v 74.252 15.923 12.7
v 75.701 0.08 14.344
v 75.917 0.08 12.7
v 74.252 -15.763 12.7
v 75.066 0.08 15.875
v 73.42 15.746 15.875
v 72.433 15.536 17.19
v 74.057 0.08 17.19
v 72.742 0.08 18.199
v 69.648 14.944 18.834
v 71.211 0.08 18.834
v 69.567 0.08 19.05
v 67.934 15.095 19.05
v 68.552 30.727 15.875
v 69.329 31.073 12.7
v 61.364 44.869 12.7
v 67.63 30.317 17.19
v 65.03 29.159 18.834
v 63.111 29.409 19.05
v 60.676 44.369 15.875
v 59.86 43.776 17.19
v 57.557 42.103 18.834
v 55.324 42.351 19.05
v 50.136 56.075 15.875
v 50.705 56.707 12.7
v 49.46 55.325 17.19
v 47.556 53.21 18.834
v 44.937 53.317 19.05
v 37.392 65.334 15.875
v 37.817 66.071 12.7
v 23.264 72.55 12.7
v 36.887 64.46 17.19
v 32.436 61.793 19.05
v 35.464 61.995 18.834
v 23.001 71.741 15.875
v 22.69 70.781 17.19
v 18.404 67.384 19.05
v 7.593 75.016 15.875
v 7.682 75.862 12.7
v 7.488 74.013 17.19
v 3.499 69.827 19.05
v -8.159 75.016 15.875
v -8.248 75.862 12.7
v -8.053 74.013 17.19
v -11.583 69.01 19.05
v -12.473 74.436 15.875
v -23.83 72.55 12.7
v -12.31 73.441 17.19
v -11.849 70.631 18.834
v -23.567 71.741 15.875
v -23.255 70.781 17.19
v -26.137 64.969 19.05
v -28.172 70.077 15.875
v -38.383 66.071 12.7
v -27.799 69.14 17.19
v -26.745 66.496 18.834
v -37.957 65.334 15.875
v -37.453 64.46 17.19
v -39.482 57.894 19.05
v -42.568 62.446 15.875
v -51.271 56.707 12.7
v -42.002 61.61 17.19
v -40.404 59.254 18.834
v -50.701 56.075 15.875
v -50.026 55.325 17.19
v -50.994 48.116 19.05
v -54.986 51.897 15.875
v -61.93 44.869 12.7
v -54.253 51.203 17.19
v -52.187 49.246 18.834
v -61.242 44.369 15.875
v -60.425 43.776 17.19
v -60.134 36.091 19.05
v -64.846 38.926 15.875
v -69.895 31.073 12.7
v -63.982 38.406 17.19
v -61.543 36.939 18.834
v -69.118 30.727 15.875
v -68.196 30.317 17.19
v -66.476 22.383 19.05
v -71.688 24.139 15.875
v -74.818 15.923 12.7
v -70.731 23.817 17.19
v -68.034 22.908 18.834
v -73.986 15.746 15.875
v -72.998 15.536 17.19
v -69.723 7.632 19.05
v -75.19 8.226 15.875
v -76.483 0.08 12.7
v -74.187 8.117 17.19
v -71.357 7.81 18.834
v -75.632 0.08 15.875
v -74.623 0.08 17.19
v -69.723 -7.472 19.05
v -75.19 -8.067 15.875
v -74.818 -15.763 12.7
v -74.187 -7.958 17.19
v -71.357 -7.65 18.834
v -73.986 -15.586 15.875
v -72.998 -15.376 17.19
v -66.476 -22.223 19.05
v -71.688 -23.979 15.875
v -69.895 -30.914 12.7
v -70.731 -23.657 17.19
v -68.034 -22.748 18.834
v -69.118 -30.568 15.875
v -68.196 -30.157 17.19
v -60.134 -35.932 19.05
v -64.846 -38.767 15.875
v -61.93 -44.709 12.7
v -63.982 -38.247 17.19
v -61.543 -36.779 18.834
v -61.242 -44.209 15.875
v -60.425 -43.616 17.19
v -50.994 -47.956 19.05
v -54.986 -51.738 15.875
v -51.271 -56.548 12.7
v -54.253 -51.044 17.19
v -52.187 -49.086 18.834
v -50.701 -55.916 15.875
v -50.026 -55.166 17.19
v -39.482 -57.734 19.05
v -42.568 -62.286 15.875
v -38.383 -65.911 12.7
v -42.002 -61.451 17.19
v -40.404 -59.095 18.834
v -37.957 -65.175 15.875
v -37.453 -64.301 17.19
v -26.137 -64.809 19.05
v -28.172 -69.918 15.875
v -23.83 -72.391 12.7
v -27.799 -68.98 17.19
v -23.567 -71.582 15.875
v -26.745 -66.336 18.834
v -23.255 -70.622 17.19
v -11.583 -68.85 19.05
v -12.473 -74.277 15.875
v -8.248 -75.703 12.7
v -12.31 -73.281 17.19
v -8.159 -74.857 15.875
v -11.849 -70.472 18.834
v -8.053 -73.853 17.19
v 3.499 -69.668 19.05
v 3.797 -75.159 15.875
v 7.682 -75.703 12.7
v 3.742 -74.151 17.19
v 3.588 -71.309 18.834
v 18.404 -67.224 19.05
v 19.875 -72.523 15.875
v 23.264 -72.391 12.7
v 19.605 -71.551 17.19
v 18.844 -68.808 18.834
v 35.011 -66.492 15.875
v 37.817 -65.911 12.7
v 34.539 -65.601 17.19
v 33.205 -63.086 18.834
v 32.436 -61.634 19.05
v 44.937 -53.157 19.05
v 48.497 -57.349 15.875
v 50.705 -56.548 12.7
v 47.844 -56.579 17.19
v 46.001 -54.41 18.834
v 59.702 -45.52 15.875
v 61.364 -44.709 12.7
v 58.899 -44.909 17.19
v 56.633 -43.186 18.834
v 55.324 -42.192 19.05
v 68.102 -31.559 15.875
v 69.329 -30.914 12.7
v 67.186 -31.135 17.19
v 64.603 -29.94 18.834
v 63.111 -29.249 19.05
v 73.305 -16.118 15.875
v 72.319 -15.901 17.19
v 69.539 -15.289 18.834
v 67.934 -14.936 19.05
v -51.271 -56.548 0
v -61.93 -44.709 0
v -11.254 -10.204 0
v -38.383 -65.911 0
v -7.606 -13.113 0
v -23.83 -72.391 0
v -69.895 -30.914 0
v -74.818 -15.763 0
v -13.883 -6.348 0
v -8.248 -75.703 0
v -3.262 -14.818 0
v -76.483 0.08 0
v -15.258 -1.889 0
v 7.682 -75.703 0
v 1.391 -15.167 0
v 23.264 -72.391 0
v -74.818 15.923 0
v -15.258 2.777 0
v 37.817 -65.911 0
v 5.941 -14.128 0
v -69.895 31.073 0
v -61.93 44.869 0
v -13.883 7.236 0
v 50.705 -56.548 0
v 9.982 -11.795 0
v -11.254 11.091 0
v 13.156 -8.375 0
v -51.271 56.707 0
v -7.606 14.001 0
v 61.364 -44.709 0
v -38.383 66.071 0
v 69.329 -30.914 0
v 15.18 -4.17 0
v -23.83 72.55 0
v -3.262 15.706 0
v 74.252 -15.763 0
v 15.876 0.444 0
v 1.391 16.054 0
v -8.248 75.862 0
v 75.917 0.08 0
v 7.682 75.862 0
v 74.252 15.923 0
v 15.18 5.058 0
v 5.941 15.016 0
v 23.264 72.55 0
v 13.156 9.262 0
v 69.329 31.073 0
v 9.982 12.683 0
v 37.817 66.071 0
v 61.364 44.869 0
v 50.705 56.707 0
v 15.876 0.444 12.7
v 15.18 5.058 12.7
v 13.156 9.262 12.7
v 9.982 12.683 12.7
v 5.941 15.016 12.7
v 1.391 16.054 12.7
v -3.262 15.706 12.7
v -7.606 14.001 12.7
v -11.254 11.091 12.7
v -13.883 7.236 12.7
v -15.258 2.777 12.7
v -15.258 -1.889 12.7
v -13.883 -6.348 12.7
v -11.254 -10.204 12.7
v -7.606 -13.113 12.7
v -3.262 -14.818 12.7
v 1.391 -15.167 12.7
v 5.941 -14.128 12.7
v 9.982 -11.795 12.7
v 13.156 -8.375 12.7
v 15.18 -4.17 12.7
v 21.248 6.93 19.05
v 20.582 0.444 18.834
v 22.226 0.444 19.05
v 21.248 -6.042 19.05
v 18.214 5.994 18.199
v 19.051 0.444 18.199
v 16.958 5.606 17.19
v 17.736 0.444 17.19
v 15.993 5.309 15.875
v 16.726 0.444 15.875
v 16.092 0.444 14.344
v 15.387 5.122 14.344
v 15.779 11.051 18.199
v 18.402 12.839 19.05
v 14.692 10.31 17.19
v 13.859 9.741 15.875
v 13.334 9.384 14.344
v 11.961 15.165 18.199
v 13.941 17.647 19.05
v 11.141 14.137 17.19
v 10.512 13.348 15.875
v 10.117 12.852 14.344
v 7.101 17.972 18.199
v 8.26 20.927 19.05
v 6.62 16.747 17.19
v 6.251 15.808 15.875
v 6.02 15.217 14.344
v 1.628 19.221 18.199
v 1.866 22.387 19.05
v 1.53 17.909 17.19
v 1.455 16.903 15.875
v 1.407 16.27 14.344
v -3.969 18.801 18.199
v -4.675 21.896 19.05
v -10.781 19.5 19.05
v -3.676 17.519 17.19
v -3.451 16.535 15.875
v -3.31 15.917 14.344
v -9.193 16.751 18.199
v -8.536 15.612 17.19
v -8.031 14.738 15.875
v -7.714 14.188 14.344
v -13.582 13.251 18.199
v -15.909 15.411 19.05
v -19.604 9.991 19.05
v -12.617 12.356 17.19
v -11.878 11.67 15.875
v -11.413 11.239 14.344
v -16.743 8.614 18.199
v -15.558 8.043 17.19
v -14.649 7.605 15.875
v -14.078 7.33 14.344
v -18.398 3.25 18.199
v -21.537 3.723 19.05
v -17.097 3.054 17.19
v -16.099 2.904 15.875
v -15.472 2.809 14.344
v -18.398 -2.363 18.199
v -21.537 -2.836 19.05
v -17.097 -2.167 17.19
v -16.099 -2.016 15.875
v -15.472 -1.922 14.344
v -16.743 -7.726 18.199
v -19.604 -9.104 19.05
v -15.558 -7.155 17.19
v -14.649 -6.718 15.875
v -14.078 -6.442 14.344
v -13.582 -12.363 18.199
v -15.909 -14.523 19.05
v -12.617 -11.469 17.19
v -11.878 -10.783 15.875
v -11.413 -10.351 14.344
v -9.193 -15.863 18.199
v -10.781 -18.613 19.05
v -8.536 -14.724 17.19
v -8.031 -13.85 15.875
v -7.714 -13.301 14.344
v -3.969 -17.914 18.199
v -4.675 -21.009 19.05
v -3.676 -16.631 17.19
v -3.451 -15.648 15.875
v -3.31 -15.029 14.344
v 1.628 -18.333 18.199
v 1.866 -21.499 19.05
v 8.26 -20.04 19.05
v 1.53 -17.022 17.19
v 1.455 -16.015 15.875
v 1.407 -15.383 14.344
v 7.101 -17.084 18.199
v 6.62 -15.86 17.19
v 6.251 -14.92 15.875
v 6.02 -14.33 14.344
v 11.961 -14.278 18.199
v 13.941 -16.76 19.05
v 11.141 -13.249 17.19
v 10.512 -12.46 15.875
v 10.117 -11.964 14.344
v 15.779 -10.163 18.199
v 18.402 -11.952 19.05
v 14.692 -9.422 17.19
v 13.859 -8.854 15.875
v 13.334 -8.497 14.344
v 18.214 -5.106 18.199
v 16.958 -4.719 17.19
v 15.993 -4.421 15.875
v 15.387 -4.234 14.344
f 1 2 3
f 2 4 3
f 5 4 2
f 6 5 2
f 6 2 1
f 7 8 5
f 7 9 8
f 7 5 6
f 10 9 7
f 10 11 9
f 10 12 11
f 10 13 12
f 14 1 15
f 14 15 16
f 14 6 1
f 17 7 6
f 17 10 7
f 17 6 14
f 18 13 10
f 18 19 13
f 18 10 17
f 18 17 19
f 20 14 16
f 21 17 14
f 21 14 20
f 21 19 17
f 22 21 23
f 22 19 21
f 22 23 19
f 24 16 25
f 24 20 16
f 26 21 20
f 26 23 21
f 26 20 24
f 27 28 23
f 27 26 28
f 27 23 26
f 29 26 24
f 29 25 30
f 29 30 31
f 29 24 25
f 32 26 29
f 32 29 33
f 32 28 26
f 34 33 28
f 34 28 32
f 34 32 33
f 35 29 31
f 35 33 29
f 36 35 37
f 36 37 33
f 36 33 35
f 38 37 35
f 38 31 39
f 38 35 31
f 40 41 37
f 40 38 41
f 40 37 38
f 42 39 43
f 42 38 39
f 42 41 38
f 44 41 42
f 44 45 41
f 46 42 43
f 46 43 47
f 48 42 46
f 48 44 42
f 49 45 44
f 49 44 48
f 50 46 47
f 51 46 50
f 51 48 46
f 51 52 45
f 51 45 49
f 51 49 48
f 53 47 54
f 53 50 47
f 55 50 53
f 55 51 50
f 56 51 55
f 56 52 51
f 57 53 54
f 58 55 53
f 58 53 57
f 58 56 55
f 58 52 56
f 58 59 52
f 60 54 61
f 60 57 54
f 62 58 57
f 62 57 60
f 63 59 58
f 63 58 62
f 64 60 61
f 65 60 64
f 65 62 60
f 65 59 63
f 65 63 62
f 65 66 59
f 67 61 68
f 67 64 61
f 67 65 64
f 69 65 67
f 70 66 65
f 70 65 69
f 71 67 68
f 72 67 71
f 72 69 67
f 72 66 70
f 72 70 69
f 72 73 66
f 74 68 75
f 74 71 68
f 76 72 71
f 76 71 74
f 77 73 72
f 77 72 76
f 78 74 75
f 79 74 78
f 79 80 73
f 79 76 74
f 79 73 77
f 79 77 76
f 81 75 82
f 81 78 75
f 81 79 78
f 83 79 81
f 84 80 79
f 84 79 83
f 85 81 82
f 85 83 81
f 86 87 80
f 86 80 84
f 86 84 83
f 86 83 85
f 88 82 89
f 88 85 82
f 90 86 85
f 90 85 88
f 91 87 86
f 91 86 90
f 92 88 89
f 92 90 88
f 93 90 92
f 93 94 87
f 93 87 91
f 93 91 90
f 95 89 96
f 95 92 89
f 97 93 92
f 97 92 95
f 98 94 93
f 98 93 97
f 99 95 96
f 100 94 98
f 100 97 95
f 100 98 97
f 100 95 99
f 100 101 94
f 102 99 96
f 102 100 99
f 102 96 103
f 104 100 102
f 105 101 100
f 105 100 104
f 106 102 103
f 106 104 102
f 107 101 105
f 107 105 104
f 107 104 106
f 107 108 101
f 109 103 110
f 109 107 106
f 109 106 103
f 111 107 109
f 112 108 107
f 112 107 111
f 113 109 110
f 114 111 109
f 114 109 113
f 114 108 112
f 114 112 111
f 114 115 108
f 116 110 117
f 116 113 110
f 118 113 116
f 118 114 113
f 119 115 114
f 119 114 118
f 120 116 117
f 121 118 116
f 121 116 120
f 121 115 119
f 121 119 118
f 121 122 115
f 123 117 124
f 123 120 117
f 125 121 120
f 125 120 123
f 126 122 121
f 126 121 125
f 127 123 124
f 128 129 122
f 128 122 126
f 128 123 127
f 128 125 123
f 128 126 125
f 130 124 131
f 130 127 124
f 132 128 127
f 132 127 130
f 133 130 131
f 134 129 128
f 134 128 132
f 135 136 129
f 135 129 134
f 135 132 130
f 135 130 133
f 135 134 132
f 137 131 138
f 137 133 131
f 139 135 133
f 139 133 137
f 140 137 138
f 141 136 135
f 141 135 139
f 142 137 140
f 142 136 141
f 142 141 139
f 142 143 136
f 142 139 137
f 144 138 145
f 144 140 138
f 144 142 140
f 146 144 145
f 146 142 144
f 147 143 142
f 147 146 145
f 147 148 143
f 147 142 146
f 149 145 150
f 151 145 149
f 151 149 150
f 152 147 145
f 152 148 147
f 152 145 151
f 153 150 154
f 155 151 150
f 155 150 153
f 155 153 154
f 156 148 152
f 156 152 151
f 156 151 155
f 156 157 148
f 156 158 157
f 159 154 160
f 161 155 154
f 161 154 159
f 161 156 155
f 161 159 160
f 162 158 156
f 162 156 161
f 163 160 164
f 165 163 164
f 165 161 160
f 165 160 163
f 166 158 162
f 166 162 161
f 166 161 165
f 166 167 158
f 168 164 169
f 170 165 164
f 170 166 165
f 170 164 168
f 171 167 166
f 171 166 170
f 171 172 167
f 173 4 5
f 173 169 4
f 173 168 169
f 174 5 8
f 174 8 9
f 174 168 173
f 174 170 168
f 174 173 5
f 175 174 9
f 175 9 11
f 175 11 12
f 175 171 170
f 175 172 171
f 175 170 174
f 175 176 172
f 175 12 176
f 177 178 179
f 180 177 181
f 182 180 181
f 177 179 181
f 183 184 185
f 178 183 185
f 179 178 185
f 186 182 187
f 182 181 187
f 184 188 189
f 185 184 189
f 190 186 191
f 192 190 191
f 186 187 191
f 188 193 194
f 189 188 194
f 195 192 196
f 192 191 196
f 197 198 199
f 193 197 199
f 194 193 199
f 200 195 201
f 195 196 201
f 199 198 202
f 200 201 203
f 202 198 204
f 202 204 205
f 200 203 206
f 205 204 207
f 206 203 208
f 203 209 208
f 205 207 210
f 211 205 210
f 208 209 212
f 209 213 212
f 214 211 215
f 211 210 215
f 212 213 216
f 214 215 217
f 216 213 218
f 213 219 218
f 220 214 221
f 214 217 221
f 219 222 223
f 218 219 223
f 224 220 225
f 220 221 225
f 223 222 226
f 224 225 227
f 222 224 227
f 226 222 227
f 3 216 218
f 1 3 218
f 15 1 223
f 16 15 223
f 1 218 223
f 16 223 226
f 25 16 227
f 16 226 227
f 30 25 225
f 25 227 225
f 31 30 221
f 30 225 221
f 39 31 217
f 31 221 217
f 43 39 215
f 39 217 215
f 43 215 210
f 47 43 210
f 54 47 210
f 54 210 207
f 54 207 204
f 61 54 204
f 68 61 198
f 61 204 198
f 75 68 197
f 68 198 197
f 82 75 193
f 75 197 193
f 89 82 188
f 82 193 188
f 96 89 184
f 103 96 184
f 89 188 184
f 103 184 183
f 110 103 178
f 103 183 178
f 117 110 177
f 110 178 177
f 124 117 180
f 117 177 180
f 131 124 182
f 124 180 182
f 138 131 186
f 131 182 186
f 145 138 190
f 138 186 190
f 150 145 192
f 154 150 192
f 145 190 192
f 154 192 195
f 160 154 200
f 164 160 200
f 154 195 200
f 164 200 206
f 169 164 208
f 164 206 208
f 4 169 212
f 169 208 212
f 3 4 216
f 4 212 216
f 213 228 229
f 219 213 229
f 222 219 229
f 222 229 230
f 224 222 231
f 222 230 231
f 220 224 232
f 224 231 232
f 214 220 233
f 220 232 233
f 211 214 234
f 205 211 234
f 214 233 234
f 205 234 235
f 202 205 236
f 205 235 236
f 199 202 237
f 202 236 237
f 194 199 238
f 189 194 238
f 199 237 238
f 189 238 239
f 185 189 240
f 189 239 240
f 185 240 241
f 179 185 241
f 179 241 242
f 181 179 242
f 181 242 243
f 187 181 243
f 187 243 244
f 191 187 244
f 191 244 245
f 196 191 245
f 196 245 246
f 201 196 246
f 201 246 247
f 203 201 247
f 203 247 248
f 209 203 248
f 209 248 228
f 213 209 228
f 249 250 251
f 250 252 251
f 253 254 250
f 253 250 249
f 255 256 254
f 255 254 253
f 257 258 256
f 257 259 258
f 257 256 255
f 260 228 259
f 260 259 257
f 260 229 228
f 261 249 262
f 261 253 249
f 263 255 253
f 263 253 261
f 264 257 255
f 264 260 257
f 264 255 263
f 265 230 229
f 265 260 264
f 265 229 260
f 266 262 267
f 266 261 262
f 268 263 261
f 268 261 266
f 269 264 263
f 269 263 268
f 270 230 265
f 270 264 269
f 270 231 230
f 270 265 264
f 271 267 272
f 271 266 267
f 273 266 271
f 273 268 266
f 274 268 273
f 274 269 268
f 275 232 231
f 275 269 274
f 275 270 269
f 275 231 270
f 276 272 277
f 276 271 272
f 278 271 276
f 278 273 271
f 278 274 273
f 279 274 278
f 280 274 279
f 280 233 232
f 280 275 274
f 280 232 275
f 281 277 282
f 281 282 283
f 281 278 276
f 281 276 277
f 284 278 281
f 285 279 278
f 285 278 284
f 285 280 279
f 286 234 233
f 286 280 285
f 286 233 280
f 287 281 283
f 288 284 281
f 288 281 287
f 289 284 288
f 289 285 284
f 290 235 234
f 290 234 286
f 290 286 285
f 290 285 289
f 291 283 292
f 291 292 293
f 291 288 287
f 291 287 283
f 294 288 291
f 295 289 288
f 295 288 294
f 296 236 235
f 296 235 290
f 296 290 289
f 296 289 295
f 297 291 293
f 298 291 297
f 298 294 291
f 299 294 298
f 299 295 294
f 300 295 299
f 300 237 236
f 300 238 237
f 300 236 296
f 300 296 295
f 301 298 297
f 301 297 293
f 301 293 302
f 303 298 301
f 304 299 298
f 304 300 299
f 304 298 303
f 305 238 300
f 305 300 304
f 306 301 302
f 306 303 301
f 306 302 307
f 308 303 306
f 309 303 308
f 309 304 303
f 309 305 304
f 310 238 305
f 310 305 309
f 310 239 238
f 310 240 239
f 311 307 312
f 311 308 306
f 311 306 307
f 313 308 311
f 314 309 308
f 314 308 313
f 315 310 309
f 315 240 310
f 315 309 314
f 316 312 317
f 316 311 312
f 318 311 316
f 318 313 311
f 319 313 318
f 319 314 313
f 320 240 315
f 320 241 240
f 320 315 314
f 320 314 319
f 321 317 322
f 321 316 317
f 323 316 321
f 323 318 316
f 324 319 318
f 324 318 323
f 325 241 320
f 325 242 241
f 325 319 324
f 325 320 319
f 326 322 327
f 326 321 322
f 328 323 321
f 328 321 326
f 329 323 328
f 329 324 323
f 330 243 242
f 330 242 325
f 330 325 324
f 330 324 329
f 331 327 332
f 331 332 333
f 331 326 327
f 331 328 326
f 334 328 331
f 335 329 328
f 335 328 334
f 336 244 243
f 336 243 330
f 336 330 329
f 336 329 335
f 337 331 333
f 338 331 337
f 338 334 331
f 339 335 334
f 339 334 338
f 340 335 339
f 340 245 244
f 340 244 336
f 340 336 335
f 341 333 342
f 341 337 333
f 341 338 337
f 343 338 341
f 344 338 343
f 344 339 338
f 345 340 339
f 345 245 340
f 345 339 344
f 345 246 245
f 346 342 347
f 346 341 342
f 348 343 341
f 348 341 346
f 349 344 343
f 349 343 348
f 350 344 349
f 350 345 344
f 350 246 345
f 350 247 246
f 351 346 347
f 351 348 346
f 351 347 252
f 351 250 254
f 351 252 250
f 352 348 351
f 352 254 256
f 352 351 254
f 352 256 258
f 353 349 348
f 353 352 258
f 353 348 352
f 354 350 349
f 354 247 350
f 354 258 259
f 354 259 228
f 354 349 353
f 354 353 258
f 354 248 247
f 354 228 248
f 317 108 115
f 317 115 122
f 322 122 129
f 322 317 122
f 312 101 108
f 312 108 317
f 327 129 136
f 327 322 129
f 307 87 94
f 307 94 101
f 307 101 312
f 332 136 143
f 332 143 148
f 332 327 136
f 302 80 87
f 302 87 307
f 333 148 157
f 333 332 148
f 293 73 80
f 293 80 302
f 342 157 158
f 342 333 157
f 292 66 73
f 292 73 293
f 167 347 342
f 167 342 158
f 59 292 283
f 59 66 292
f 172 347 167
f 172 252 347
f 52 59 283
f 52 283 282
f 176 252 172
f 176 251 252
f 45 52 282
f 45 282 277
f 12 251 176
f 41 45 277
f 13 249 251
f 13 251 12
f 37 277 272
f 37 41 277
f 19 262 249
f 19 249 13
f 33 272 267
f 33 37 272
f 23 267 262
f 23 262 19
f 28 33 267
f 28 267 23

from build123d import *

# Parameters (mm, degrees)
F0_R     = 76.2
F1_DEPTH = 19.05
F2_R     = 15.6543846093
F3_DEPTH = 19.051
F4_R     = 6.35


with BuildPart() as f1:
    # F0 (on Top) → F1 (new body)
    with BuildSketch(Plane.XY):
        with Locations((-0.2828244178, 0.0797724133)):
            Circle(F0_R)
    extrude(amount=F1_DEPTH)

    # F2 (on face) → F3 (cut, through all)
    with BuildSketch(Plane.XY.offset(19.05)):
        with Locations((0.221362061, 0.4437770694)):
            Circle(F2_R)
    extrude(amount=-F3_DEPTH, mode=Mode.SUBTRACT)

    # F4
    f4_edges = [f1.edges().sort_by_distance(p)[0] for p in [
        (-76.482824, 0.079772, 19.05),
        (-15.433023, 0.443777, 19.05),
    ]]
    fillet(f4_edges, radius=F4_R)


solid = f1.part
